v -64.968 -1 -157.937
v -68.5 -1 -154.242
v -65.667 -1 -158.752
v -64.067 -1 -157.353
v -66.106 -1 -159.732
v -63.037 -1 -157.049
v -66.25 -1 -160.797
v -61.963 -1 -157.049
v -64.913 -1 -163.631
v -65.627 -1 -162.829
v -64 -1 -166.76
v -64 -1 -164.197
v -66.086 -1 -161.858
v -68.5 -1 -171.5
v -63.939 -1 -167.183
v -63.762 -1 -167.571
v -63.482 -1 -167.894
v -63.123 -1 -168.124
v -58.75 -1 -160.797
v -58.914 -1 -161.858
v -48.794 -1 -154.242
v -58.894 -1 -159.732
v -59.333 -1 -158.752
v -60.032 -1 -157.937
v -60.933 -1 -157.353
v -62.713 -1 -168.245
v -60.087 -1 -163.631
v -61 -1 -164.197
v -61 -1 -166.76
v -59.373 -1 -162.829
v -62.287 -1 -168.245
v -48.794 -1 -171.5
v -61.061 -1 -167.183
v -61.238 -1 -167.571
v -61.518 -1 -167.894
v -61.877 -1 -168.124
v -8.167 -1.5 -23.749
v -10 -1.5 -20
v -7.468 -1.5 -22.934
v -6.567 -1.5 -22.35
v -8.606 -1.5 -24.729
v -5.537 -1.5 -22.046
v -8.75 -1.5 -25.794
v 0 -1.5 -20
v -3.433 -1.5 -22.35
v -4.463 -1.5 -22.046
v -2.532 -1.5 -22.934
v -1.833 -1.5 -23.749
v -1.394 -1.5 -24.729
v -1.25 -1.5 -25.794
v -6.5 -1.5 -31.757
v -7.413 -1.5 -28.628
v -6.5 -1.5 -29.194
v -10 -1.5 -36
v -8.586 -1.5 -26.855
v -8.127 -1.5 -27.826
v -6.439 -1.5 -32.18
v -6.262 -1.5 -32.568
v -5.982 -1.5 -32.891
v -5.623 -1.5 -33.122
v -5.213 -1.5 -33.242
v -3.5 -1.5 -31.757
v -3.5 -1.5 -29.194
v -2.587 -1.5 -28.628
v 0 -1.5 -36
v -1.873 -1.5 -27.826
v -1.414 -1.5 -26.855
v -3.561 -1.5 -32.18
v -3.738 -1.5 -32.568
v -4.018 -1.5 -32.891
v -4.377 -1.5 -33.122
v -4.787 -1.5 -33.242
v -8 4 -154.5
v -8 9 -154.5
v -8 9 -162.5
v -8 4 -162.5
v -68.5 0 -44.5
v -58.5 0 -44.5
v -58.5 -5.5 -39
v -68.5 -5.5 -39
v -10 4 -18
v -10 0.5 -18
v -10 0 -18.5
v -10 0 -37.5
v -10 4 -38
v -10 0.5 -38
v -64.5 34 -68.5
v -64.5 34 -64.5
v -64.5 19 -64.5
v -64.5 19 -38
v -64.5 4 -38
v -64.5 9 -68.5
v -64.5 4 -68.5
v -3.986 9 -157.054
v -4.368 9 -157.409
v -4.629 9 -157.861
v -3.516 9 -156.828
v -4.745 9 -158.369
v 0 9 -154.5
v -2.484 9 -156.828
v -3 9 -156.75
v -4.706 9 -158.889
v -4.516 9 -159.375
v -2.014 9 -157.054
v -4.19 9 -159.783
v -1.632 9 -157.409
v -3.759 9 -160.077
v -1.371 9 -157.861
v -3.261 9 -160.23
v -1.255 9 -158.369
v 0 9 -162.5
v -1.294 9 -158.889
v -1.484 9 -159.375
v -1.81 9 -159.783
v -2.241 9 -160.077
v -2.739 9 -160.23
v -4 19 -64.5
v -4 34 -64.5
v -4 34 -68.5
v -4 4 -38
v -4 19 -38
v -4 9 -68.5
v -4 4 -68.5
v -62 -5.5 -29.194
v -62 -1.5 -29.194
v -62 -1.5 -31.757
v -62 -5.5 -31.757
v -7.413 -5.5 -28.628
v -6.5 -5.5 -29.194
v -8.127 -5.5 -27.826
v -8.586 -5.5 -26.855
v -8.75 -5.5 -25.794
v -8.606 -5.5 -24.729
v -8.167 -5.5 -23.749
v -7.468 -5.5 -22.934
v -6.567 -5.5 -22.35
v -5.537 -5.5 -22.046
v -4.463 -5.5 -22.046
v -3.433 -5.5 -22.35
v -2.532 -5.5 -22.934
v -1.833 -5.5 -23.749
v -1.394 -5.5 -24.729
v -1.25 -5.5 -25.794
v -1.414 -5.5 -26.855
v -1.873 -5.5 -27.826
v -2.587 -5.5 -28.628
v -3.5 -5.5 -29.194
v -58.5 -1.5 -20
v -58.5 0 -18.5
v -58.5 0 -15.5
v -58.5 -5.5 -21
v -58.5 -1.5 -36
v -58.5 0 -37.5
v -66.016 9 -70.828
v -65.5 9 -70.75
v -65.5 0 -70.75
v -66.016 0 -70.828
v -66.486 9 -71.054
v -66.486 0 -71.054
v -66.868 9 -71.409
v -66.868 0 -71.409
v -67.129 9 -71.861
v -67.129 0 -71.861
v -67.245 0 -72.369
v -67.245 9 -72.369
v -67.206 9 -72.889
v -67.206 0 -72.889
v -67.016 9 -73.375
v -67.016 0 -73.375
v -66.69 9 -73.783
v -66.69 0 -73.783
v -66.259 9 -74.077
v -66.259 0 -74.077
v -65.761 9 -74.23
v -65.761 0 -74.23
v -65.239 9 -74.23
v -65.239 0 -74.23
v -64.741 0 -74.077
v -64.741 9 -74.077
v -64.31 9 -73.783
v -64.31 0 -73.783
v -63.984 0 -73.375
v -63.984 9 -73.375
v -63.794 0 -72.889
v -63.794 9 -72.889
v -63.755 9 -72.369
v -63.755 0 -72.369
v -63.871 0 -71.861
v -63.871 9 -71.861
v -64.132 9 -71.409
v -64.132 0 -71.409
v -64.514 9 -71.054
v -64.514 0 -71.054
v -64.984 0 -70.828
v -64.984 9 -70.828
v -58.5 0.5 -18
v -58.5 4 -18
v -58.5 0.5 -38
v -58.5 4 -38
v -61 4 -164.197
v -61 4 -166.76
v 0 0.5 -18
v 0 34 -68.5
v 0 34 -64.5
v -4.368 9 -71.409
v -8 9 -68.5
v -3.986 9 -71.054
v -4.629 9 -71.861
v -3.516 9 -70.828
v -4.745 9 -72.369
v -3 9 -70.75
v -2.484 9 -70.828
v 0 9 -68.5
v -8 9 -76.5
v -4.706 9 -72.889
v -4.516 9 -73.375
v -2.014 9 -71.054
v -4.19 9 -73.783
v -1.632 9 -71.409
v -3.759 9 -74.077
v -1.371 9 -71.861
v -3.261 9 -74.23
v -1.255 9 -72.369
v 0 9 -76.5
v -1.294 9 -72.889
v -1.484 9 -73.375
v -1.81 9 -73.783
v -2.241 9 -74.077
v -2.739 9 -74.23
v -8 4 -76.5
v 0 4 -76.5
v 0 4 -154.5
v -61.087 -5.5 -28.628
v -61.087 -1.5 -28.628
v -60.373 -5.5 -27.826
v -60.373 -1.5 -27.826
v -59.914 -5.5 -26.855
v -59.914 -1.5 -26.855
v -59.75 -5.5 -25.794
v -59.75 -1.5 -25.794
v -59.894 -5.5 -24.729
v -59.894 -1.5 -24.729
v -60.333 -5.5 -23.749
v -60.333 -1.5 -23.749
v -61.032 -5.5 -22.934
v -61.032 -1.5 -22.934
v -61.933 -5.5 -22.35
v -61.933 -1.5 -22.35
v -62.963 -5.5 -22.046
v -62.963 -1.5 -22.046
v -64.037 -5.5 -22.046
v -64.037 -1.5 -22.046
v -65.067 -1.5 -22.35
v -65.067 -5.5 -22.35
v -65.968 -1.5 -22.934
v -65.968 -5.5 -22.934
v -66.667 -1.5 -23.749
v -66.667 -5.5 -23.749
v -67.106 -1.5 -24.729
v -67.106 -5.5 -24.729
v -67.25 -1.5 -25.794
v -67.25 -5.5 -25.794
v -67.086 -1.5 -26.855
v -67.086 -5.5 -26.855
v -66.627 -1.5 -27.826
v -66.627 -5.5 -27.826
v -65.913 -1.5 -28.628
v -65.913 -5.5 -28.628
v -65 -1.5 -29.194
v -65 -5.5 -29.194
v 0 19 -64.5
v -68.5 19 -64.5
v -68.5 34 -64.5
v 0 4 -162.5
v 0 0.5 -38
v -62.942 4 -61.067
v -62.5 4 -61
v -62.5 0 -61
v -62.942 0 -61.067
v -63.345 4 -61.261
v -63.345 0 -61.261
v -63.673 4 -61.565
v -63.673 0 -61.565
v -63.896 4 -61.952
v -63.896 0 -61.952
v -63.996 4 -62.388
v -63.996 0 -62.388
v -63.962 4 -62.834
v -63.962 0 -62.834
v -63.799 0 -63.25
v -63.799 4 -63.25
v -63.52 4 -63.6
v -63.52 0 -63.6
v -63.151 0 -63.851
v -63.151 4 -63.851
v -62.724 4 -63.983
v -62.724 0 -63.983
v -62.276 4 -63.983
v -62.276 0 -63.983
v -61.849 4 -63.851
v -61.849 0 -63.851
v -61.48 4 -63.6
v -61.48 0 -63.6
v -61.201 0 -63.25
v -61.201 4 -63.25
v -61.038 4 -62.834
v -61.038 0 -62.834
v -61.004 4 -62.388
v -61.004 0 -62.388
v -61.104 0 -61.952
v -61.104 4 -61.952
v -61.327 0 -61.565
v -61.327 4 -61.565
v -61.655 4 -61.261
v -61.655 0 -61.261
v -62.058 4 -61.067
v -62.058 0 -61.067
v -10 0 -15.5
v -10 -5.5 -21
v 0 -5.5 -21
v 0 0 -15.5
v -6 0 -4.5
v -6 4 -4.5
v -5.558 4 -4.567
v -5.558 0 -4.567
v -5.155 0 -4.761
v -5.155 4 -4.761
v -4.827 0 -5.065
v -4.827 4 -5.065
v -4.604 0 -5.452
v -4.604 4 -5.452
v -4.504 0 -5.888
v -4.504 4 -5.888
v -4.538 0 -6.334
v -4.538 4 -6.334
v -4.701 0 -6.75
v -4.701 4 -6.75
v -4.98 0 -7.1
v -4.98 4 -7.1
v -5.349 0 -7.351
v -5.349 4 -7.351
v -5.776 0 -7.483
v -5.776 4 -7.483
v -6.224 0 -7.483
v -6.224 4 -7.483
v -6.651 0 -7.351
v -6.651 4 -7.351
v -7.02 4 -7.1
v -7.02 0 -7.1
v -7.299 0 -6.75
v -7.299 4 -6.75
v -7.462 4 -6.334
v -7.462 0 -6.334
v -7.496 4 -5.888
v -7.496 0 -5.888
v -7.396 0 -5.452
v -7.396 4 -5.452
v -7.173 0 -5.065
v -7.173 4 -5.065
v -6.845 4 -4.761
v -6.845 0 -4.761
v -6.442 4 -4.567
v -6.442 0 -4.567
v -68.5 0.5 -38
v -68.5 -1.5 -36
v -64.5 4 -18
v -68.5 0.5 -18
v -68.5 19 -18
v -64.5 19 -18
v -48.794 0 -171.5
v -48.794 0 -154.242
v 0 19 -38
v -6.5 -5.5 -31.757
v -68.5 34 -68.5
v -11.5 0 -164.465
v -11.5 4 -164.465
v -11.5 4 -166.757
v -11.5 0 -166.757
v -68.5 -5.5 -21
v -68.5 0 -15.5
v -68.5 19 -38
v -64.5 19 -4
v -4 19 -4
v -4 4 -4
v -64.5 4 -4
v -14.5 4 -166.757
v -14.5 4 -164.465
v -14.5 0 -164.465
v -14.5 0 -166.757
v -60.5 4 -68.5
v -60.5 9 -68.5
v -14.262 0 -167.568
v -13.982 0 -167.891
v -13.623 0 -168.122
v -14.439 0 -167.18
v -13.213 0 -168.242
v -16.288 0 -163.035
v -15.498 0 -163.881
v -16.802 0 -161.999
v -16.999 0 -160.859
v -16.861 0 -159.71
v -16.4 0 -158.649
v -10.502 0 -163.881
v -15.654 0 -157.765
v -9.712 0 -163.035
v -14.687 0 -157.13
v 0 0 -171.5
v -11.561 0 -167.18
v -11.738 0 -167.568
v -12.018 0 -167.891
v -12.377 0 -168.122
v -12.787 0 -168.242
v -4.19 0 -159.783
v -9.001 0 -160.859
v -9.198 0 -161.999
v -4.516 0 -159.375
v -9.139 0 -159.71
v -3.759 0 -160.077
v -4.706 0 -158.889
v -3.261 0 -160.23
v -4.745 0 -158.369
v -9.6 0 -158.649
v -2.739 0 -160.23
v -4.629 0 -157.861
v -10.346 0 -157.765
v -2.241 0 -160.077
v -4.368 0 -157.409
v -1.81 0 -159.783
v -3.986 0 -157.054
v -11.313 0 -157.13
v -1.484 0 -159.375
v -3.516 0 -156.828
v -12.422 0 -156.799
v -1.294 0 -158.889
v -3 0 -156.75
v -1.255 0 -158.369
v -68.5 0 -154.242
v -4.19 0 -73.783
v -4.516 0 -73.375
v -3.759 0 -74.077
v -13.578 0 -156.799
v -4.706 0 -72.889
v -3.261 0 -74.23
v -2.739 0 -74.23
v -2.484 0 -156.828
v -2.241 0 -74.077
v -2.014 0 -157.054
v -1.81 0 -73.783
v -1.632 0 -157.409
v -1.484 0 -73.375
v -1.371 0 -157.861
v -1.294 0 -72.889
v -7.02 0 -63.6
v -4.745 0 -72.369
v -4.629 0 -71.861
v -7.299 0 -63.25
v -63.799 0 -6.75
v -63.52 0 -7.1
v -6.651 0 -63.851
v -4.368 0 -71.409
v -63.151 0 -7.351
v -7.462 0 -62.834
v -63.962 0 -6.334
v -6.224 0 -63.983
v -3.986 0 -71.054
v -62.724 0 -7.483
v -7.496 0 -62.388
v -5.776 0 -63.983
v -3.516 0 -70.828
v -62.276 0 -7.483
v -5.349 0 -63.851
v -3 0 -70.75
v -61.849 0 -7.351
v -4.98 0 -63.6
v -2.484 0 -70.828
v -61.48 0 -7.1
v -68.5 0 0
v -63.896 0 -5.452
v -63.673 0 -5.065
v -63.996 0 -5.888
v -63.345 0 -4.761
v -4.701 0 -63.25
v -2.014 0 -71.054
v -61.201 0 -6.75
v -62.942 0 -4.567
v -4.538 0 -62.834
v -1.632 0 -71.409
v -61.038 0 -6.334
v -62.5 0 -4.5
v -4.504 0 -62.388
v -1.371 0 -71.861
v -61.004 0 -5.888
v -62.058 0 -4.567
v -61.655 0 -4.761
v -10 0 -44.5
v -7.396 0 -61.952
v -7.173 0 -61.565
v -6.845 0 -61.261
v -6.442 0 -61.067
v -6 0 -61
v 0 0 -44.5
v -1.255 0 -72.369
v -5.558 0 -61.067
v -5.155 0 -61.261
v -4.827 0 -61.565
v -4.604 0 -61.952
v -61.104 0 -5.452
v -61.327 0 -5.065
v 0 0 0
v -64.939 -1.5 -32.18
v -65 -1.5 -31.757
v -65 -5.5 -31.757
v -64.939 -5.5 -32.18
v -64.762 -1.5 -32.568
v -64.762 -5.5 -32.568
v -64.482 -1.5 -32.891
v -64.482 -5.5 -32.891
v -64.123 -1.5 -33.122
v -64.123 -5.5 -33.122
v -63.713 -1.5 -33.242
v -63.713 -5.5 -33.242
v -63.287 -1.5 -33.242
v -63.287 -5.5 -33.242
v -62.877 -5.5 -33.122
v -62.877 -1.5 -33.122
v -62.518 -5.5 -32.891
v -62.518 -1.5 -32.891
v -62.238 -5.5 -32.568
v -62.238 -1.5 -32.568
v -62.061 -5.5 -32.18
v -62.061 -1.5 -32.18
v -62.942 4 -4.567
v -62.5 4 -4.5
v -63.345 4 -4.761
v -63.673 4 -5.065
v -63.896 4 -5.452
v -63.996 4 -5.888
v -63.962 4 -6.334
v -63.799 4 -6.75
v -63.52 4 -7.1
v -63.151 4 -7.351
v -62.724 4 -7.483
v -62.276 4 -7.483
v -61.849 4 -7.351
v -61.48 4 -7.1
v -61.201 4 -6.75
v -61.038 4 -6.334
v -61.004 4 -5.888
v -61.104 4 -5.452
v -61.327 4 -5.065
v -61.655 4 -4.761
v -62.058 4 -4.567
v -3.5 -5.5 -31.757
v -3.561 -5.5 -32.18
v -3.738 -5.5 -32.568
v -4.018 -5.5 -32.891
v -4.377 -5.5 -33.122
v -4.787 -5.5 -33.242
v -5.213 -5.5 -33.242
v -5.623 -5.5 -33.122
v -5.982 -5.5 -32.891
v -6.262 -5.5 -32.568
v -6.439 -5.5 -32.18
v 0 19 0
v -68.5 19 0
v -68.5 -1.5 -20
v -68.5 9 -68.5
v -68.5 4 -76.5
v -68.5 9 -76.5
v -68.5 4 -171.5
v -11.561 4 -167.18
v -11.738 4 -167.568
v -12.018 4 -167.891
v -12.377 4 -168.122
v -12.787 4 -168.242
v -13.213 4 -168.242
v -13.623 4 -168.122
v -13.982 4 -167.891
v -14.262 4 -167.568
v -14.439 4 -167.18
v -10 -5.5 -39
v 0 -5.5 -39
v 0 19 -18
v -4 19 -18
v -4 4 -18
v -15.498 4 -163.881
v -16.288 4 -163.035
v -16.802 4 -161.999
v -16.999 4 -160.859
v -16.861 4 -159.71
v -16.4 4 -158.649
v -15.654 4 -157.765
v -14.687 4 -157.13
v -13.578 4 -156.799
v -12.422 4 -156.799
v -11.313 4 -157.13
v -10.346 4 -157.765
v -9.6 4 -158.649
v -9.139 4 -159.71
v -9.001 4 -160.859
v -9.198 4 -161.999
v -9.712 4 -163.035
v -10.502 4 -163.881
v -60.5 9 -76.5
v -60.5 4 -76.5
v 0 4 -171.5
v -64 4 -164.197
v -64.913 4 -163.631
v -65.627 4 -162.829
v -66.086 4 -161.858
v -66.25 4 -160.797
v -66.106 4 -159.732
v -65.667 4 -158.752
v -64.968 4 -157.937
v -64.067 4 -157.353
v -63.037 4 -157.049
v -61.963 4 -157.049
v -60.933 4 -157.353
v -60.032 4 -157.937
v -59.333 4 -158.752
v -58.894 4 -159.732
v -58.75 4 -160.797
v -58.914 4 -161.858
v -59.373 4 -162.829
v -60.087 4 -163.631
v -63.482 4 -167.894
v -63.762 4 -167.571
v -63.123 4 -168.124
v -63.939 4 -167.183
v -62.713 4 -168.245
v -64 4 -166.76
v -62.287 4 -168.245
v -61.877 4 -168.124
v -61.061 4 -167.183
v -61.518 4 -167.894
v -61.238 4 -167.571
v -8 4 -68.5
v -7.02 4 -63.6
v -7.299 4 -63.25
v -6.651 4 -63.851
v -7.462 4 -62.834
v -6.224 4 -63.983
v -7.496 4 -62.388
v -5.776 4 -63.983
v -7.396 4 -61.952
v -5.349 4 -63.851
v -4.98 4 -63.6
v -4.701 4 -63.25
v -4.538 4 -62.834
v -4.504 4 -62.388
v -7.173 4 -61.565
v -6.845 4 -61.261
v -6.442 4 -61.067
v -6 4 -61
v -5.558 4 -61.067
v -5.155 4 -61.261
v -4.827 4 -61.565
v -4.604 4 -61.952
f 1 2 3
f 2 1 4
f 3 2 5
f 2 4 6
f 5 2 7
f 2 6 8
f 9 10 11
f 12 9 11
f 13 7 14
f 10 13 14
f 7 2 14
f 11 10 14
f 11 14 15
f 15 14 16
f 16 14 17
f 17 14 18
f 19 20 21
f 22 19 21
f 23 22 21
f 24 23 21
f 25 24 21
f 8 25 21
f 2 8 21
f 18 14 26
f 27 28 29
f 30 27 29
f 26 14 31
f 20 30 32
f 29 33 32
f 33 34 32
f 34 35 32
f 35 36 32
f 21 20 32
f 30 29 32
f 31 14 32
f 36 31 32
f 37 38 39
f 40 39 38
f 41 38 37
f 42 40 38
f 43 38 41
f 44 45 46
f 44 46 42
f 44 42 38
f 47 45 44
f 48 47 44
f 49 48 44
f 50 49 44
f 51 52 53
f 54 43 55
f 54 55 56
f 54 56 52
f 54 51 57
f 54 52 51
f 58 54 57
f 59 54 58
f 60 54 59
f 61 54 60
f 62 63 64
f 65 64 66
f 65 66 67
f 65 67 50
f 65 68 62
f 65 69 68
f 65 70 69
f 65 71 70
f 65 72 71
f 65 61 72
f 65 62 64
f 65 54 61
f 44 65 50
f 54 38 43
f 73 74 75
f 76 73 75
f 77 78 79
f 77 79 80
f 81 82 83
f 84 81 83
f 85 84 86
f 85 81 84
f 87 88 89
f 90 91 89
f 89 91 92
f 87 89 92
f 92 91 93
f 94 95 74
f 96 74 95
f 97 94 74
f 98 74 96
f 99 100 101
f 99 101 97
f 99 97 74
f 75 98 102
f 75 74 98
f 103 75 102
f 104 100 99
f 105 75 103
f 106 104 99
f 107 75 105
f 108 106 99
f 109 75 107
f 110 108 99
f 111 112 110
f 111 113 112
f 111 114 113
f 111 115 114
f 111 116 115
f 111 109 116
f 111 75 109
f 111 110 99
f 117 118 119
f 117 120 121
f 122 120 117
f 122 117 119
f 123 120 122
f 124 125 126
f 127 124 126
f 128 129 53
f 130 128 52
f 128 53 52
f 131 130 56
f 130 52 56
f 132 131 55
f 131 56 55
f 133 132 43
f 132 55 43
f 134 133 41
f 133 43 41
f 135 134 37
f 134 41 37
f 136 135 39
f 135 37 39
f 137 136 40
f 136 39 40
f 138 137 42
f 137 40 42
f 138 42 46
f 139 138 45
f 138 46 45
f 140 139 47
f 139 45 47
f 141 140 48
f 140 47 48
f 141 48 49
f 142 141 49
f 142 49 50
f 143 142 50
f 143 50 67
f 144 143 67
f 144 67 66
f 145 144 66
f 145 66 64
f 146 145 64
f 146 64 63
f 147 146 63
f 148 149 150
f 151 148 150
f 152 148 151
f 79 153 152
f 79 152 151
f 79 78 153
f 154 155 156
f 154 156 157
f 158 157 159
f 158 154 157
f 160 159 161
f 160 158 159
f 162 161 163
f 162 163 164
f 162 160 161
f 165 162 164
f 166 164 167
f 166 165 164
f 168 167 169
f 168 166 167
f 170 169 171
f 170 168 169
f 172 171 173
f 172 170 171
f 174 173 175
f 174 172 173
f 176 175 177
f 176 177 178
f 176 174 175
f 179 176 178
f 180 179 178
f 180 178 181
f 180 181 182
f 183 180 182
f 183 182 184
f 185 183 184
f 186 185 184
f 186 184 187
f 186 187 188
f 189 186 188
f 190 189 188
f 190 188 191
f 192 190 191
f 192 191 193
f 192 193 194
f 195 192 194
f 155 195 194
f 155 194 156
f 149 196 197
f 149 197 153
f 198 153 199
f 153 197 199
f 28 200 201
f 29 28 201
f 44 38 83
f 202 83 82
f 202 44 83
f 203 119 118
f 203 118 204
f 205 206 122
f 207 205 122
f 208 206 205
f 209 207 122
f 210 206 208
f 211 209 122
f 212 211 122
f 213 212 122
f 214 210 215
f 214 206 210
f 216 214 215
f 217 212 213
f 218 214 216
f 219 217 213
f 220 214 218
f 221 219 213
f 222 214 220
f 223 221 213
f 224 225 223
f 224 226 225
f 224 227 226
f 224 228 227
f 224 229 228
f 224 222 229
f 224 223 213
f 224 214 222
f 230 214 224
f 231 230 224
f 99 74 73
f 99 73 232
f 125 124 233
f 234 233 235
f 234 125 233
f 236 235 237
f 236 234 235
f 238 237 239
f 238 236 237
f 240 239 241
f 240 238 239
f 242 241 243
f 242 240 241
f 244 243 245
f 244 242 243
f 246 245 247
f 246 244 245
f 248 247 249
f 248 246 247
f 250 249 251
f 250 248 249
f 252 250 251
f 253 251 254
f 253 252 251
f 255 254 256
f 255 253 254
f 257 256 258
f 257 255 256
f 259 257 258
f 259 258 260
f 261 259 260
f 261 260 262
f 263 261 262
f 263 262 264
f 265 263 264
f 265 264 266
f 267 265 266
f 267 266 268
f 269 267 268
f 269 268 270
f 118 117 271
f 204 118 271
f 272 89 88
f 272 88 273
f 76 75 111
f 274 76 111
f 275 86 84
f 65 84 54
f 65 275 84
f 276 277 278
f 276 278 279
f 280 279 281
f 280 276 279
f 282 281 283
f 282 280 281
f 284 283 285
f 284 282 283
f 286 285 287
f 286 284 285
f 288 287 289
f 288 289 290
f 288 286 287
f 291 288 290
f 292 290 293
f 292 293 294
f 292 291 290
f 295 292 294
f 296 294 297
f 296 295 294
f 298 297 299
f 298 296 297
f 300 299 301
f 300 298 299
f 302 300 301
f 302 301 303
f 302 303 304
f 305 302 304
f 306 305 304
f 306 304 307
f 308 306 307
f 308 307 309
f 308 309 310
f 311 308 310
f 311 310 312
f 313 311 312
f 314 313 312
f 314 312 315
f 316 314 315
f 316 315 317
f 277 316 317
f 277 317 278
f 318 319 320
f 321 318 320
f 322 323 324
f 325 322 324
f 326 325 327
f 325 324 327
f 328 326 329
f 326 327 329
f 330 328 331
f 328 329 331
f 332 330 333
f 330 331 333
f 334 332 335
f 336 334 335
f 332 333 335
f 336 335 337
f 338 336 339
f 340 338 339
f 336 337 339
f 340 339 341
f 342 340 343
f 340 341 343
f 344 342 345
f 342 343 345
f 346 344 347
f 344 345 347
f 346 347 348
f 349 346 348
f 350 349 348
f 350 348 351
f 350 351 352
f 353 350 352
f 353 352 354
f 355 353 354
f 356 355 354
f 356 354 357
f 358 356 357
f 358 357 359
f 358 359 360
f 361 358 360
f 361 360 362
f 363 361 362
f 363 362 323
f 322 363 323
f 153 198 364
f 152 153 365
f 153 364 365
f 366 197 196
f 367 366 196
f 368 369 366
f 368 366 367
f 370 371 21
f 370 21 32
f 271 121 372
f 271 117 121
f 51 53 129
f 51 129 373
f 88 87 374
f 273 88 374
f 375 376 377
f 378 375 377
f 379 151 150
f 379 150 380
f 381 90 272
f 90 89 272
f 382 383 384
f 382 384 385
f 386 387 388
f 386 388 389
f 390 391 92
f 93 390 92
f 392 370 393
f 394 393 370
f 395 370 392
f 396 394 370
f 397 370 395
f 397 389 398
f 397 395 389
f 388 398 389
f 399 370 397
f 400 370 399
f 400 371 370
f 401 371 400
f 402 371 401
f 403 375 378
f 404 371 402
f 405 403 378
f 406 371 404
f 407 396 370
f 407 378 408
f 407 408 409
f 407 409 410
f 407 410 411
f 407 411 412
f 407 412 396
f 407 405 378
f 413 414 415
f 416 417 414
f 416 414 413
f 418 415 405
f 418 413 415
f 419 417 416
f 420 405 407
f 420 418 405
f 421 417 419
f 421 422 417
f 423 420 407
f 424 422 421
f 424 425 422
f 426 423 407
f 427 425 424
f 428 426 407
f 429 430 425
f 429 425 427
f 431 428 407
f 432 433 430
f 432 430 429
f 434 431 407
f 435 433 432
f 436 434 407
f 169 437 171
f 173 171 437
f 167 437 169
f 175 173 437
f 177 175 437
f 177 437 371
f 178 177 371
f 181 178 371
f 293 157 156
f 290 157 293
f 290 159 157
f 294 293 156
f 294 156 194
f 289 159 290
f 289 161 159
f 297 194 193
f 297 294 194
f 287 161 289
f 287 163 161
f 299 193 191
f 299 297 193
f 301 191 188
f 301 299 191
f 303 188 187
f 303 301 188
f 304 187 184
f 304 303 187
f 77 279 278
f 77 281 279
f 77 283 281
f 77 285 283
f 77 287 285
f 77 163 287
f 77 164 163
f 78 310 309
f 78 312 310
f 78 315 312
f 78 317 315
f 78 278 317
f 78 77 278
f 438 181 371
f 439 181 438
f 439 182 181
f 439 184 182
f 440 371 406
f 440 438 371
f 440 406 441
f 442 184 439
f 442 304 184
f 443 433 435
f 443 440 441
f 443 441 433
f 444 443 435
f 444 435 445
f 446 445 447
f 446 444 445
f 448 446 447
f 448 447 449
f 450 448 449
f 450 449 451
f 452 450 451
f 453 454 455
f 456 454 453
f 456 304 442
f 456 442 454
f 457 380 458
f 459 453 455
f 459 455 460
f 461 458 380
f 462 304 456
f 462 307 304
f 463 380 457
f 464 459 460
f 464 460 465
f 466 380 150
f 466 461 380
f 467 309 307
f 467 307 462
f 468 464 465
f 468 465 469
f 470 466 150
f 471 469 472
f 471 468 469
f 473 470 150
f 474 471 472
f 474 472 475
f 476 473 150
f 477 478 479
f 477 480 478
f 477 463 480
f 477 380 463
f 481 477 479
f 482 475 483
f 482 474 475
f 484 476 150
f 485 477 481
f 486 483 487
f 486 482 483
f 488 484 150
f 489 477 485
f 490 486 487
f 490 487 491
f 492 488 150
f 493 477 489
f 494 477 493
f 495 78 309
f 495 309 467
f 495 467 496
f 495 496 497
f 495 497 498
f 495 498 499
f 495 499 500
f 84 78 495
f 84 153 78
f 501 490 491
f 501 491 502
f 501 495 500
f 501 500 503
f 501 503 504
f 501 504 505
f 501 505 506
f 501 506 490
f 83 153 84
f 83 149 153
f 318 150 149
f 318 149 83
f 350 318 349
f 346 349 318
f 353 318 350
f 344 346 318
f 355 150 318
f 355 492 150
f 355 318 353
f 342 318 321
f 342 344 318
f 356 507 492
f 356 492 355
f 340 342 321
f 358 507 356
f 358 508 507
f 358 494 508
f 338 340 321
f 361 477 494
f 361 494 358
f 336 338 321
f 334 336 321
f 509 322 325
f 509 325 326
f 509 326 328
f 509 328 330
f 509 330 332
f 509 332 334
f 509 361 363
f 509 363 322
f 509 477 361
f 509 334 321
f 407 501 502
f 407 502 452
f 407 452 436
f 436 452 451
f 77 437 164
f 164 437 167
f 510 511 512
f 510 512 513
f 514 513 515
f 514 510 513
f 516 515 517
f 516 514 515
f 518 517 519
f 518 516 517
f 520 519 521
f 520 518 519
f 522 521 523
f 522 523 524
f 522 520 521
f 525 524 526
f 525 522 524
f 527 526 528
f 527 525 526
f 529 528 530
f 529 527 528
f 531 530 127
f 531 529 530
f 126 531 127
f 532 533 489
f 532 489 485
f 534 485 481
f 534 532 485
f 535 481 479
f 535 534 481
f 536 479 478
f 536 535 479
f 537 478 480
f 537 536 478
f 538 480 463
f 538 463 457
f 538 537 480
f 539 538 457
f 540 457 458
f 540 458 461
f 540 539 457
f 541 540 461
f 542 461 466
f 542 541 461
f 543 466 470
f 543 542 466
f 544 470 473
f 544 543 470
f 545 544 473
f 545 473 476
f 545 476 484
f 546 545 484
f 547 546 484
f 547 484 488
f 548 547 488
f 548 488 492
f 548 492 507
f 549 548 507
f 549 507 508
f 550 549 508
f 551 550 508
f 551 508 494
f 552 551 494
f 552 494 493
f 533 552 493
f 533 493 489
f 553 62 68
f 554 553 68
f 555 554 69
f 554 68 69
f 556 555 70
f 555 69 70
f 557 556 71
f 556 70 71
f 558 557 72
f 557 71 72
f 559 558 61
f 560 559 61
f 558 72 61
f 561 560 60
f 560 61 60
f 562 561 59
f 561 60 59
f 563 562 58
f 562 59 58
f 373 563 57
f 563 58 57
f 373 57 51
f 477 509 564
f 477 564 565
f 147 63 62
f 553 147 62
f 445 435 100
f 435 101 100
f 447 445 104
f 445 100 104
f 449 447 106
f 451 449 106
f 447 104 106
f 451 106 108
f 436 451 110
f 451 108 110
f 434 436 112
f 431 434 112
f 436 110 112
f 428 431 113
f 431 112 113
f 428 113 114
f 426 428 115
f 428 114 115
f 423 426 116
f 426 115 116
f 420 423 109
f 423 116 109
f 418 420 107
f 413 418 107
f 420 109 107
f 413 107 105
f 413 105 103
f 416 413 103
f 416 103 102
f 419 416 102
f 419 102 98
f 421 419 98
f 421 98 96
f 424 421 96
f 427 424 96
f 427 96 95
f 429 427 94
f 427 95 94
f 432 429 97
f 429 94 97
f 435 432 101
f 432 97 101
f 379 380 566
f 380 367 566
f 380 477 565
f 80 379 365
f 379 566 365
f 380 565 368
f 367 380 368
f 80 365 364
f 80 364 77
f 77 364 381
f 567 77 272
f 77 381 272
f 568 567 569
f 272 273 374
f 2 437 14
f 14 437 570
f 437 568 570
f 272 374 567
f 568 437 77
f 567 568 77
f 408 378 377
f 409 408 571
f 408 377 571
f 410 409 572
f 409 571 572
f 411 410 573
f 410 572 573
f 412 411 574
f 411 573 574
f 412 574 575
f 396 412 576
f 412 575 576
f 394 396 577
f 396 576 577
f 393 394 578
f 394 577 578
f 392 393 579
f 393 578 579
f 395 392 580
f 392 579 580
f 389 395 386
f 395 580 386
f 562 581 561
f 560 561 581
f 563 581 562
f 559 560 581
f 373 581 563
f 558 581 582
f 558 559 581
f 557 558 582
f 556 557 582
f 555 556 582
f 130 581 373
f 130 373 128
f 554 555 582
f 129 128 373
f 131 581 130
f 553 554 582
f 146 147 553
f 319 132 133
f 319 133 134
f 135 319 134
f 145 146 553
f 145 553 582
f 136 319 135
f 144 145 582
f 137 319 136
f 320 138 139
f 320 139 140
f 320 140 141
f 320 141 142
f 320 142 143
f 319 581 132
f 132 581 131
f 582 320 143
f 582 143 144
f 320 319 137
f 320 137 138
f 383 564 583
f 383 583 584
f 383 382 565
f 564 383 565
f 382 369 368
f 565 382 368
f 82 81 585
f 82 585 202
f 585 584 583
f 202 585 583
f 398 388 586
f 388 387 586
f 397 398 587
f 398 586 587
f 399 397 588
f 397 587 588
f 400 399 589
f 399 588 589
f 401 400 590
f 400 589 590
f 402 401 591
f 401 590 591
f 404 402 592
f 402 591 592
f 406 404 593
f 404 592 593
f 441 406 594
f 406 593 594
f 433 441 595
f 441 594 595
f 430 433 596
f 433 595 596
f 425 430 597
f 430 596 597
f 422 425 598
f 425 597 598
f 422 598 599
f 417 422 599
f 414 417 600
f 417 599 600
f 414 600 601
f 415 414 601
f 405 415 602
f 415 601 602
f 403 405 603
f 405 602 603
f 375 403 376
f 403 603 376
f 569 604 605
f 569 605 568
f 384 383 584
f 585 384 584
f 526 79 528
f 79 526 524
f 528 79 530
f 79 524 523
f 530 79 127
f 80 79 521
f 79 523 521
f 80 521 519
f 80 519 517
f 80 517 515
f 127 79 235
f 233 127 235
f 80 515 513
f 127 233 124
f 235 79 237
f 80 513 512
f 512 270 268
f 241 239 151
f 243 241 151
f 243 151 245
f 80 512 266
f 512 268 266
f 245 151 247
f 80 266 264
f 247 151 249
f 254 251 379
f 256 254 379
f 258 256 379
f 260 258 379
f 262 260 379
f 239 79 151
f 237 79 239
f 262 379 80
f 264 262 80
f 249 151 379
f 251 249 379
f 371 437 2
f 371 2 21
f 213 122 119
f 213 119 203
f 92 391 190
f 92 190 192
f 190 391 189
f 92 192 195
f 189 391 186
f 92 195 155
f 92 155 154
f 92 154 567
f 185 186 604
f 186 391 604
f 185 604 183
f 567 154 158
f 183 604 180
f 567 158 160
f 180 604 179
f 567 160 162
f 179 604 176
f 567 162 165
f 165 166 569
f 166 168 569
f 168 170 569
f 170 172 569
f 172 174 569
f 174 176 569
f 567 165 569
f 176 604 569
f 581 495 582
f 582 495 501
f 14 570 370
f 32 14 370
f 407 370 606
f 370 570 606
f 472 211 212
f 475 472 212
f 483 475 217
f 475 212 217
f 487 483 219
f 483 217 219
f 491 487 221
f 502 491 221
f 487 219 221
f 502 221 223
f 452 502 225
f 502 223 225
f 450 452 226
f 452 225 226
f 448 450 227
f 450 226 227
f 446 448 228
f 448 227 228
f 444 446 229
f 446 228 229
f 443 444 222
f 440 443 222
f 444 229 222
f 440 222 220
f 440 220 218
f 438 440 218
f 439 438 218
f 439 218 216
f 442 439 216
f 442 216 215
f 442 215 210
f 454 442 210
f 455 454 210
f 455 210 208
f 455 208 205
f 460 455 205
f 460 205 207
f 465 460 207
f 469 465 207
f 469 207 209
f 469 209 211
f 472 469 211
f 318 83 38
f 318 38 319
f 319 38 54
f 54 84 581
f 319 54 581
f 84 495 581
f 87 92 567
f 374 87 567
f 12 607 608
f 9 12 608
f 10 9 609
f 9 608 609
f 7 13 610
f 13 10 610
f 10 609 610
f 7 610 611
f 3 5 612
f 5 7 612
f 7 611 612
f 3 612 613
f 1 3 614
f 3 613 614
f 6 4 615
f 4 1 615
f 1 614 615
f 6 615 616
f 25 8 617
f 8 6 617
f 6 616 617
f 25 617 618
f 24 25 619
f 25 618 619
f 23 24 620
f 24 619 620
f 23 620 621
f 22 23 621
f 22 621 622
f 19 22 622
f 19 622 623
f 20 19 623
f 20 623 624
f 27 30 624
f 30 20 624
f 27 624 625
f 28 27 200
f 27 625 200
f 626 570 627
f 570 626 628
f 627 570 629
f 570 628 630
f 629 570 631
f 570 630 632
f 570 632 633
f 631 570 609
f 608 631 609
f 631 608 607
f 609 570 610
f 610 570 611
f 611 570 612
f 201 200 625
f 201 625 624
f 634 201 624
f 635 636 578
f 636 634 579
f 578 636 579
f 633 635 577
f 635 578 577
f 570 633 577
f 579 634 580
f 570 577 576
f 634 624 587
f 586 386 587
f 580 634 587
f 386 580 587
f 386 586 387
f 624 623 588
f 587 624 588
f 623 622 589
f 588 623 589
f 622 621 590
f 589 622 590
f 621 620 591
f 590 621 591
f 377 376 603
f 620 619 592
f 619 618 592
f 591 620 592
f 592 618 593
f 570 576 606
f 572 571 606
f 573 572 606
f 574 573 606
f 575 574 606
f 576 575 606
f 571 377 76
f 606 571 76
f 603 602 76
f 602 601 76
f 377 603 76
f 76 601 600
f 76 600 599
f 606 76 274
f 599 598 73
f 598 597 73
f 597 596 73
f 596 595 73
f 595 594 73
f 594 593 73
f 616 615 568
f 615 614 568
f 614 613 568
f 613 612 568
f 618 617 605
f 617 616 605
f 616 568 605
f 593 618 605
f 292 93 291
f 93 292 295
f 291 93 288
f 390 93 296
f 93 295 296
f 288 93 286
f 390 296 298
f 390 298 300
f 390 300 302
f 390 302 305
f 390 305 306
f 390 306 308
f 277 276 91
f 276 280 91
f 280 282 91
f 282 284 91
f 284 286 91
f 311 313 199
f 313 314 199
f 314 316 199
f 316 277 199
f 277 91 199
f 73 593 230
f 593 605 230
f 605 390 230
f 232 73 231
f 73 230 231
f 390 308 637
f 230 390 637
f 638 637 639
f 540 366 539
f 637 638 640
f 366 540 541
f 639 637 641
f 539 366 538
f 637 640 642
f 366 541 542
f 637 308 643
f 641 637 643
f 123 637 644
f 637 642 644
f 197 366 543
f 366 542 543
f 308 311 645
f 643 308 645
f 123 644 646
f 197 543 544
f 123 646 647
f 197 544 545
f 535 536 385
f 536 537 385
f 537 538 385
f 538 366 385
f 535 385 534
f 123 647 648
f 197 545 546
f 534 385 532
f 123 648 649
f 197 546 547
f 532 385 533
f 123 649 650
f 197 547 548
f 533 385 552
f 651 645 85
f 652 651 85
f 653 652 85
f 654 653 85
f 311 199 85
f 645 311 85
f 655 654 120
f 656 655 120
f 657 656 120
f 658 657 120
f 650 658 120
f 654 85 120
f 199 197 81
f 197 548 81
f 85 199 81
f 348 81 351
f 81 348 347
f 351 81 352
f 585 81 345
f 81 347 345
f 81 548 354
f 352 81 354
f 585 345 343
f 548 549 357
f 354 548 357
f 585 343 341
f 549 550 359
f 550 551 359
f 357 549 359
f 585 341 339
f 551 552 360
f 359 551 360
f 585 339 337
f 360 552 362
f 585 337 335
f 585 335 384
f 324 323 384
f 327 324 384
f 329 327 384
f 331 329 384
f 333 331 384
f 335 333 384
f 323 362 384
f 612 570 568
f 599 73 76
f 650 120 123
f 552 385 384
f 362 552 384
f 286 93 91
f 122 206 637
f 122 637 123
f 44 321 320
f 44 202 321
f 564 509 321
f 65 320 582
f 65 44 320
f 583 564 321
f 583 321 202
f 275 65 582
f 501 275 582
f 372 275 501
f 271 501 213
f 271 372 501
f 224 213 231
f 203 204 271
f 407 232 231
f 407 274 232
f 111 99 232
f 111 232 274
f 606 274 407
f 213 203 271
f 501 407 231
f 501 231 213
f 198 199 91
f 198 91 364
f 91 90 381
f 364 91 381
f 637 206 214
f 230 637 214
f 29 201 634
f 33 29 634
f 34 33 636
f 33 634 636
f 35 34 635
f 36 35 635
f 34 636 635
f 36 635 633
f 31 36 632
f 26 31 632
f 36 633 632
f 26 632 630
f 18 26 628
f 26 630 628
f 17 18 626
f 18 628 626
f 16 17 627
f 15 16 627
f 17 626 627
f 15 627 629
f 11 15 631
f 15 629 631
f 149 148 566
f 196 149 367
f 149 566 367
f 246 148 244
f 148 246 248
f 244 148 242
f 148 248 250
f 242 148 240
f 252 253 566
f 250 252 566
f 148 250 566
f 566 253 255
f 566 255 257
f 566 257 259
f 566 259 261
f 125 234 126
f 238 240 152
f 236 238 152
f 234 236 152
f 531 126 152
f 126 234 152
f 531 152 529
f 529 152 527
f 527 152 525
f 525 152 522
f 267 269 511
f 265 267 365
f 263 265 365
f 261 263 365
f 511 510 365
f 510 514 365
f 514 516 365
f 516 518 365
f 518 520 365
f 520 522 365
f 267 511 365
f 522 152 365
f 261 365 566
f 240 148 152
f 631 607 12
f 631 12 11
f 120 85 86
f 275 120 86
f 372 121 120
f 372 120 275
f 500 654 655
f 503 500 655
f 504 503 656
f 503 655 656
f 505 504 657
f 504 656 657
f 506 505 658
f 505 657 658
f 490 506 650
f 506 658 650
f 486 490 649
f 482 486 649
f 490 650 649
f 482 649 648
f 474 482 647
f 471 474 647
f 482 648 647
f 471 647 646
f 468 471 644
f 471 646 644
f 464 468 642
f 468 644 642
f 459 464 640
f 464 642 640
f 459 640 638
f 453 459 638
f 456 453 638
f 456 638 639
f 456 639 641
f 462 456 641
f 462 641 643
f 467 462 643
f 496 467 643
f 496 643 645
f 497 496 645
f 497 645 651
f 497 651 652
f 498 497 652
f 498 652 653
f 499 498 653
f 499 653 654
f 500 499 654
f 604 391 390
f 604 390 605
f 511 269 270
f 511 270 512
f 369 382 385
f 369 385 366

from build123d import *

# Parameters (mm, degrees)
SKETCH1_W            = 68.5
SKETCH1_H            = 64.5
BOSS_EXTRUDE3_DEPTH  = 19
SKETCH3_W            = 60.5
SKETCH3_H            = 60.5
CUT_EXTRUDE1_DEPTH   = 15
SKETCH5_W            = 68.5
SKETCH5_H            = 4
BOSS_EXTRUDE4_DEPTH  = 105
SKETCH10_W           = 10
SKETCH10_H           = 29
BOSS_EXTRUDE5_DEPTH  = 5.5
SKETCH9_W            = 4
SKETCH9_H            = 20
CUT_EXTRUDE2_DEPTH   = 20.5
SKETCH11_W           = 6
SKETCH11_H           = 20
CUT_EXTRUDE3_DEPTH   = 5.5
CHAMFER2_SIZE        = 5.5
CHAMFER3_SIZE        = 2
SKETCH12_W           = 34.25
SKETCH12_H           = 169.5
CUT_EXTRUDE4_DEPTH   = 50
SKETCH15_R           = 1.5
CUT_EXTRUDE5_DEPTH   = 50
SKETCH16_R           = 1.5
CUT_EXTRUDE6_DEPTH   = 50
SKETCH17_R           = 1.5
CUT_EXTRUDE7_DEPTH   = 50
SKETCH19_W           = 34.25
SKETCH19_H           = 4
BOSS_EXTRUDE6_DEPTH  = 2
SKETCH26_W           = 4
SKETCH26_H           = 4
BOSS_EXTRUDE7_DEPTH  = 30
SKETCH20_R           = 3.75
CUT_EXTRUDE9_DEPTH   = 179.453250181
SKETCH21_W           = 3
SKETCH21_H           = 2.563068229
CUT_EXTRUDE10_DEPTH  = 5
SKETCH18_R           = 1.5
CUT_EXTRUDE8_DEPTH   = 135
SKETCH24_R           = 4
CUT_EXTRUDE13_DEPTH  = 178.441011325
SKETCH25_W           = 3
SKETCH25_H           = 2.291900756
CUT_EXTRUDE14_DEPTH  = 5
SKETCH27_R           = 1.75
CUT_EXTRUDE15_DEPTH  = 178.441011325
BOSS_EXTRUDE9_START  = 5
SKETCH30_W           = 8
SKETCH30_H           = 8
SKETCH30_R           = 1.75
BOSS_EXTRUDE9_DEPTH  = 5
SKETCH31_W           = 8
SKETCH31_H           = 8
CUT_EXTRUDE16_DEPTH  = 5
SKETCH32_W           = 19.705511252
SKETCH32_H           = 17.257631466
BOSS_EXTRUDE10_DEPTH = 5
SKETCH33_R           = 1.5
CUT_EXTRUDE17_DEPTH  = 5
SKETCH34_R           = 3.75
CUT_EXTRUDE18_DEPTH  = 5
SKETCH35_W           = 3
SKETCH35_H           = 2.563068229
CUT_EXTRUDE19_DEPTH  = 5


# Some blends are built 0.0001 mm under size
with BuildPart() as part:
    # Sketch1 → Boss-Extrude3 (new body)
    with BuildSketch(Plane(origin=(0, 0, 0), x_dir=(1, 0, 0), z_dir=(0, 1, 0))):
        with Locations((-34.25, 32.25)):
            Rectangle(SKETCH1_W, SKETCH1_H)
    extrude(amount=BOSS_EXTRUDE3_DEPTH)

    # Sketch3 → Cut-Extrude1 (cut)
    with BuildSketch(Plane(origin=(0, 19, 0), x_dir=(1, 0, 0), z_dir=(0, 1, 0))):
        with Locations((-34.25, 34.25)):
            Rectangle(SKETCH3_W, SKETCH3_H)
    extrude(amount=-CUT_EXTRUDE1_DEPTH, mode=Mode.SUBTRACT)

    # Sketch5 → Boss-Extrude4 (add)
    with BuildSketch(Plane(origin=(0, 0, -64.5), x_dir=(-1, 0, 0), z_dir=(0, 0, -1))):
        with Locations((34.25, 2)):
            Rectangle(SKETCH5_W, SKETCH5_H)
    extrude(amount=BOSS_EXTRUDE4_DEPTH)

    # Sketch10 → Boss-Extrude5 (add)
    with BuildSketch(Plane.XZ):
        with Locations((-5, -30)):
            Rectangle(SKETCH10_W, SKETCH10_H)
    extrude(amount=BOSS_EXTRUDE5_DEPTH)

    # Sketch9 → Cut-Extrude2 (cut)
    with BuildSketch(Plane(origin=(0, 19, 0), x_dir=(1, 0, 0), z_dir=(0, 1, 0))):
        with Locations((-2, 28)):
            Rectangle(SKETCH9_W, SKETCH9_H)
    extrude(amount=-CUT_EXTRUDE2_DEPTH, mode=Mode.SUBTRACT)

    # Sketch11 → Cut-Extrude3 (cut)
    with BuildSketch(Plane(origin=(0, 4, 0), x_dir=(1, 0, 0), z_dir=(0, 1, 0))):
        with Locations((-7, 28)):
            Rectangle(SKETCH11_W, SKETCH11_H)
    extrude(amount=-CUT_EXTRUDE3_DEPTH, mode=Mode.SUBTRACT)

    # Chamfer2
    chamfer2_edges = [part.edges().sort_by_distance(p)[0] for p in [
        (-5, -5.5, -44.5),
        (-5, -5.5, -15.5),
    ]]
    chamfer(chamfer2_edges, length=CHAMFER2_SIZE - 0.0001)  # a hair under: the kernel refuses the full size

    # Chamfer3
    # the kernel refuses this chamfer: 2 mm, written as the material it adds along each edge
    with BuildSketch(Plane(origin=(0, -1.5, -38), x_dir=(0, 0.9996219169112968, -0.027495876610585623), z_dir=(-1, 0, 0)), Plane(origin=(0, -1.5, -18), x_dir=(0, -0.027495876610586403, -0.9996219169112968), z_dir=(-1, 0, 0))) as chamfer3_piece_1:
        Polygon((CHAMFER3_SIZE * 0.999621916911, -CHAMFER3_SIZE * 0.0274958766106), (-CHAMFER3_SIZE * 0.0274958766106, -CHAMFER3_SIZE * 0.999621916911), (0, 0), align=None)
    extrude(amount=10)

    # Sketch12 → Cut-Extrude4 (cut)
    with BuildSketch(Plane(origin=(0, 19, 0), x_dir=(1, 0, 0), z_dir=(0, 1, 0))):
        with Locations((-51.375, 84.75)):
            Rectangle(SKETCH12_W, SKETCH12_H)
    extrude(amount=-CUT_EXTRUDE4_DEPTH, mode=Mode.SUBTRACT)

    # Sketch15 → Cut-Extrude5 (cut)
    with BuildSketch(Plane(origin=(0, -1.5, 0), x_dir=(1, 0, 0), z_dir=(0, 1, 0))):
        with Locations(Location((-5, 31.75713966, 0), (0, 0, 270))):
            Circle(SKETCH15_R)
    extrude(amount=-CUT_EXTRUDE5_DEPTH, mode=Mode.SUBTRACT)

    # Sketch16 → Cut-Extrude6 (cut)
    with BuildSketch(Plane(origin=(0, 4, 0), x_dir=(1, 0, 0), z_dir=(0, 1, 0))):
        with Locations(Location((-6, 6, 0), (0, 0, 270))):
            Circle(SKETCH16_R)
    extrude(amount=-CUT_EXTRUDE6_DEPTH, mode=Mode.SUBTRACT)

    # Sketch17 → Cut-Extrude7 (cut)
    with BuildSketch(Plane(origin=(0, 4, 0), x_dir=(1, 0, 0), z_dir=(0, 1, 0))):
        with Locations(Location((-6, 62.5, 0), (0, 0, 270))):
            Circle(SKETCH17_R)
    extrude(amount=-CUT_EXTRUDE7_DEPTH, mode=Mode.SUBTRACT)

    # Sketch19 → Boss-Extrude6 (add)
    with BuildSketch(Plane(origin=(0, 0, -169.5), x_dir=(-1, 0, 0), z_dir=(0, 0, -1))):
        with Locations((17.125, 2)):
            Rectangle(SKETCH19_W, SKETCH19_H)
    extrude(amount=BOSS_EXTRUDE6_DEPTH)

    # Sketch26 → Boss-Extrude7 (add)
    with BuildSketch(Plane(origin=(0, 4, 0), x_dir=(1, 0, 0), z_dir=(0, 1, 0))):
        with Locations((-2, 66.5)):
            Rectangle(SKETCH26_W, SKETCH26_H)
    extrude(amount=BOSS_EXTRUDE7_DEPTH)

    # Sketch20 → Cut-Extrude9 (cut, through all)
    with BuildSketch(Plane(origin=(0, -1.5, 0), x_dir=(1, 0, 0), z_dir=(0, 1, 0))):
        with Locations(Location((-5, 25.75713966, 0), (0, 0, 270))):
            Circle(SKETCH20_R)
    extrude(amount=-CUT_EXTRUDE9_DEPTH, mode=Mode.SUBTRACT)

    # Sketch21 → Cut-Extrude10 (cut)
    with BuildSketch(Plane(origin=(0, -1.5, 0), x_dir=(1, 0, 0), z_dir=(0, 1, 0))):
        with Locations((-5, 30.475605546)):
            Rectangle(SKETCH21_W, SKETCH21_H)
    extrude(amount=-CUT_EXTRUDE10_DEPTH, mode=Mode.SUBTRACT)

    # Sketch18 → Cut-Extrude8 (cut)
    with BuildSketch(Plane(origin=(0, 4, 0), x_dir=(1, 0, 0), z_dir=(0, 1, 0))):
        with Locations(Location((-13, 166.75713966, 0), (0, 0, 270))):
            Circle(SKETCH18_R)
    extrude(amount=-CUT_EXTRUDE8_DEPTH, mode=Mode.SUBTRACT)

    # Sketch24 → Cut-Extrude13 (cut, through all)
    with BuildSketch(Plane(origin=(0, 4, 0), x_dir=(1, 0, 0), z_dir=(0, 1, 0))):
        with Locations(Location((-13, 160.75713966, 0), (0, 0, 270))):
            Circle(SKETCH24_R)
    extrude(amount=-CUT_EXTRUDE13_DEPTH, mode=Mode.SUBTRACT)

    # Sketch25 → Cut-Extrude14 (cut)
    with BuildSketch(Plane(origin=(0, 4, 0), x_dir=(1, 0, 0), z_dir=(0, 1, 0))):
        with Locations((-13, 165.611189282)):
            Rectangle(SKETCH25_W, SKETCH25_H)
    extrude(amount=-CUT_EXTRUDE14_DEPTH, mode=Mode.SUBTRACT)

    # Sketch27 → Cut-Extrude15 (cut, through all)
    with BuildSketch(Plane(origin=(0, 4, 0), x_dir=(1, 0, 0), z_dir=(0, 1, 0))):
        with Locations(Location((-3, 72.5, 0), (0, 0, 270))):
            Circle(SKETCH27_R)
        with Locations(Location((-3, 158.5, 0), (0, 0, 270))):
            Circle(SKETCH27_R)
    extrude(amount=-CUT_EXTRUDE15_DEPTH, mode=Mode.SUBTRACT)

    # Sketch30 → Boss-Extrude9 (add)
    # profile 1 of 2: a face of its own
    with BuildSketch(Plane(origin=(0, 4, 0), x_dir=(1, 0, 0), z_dir=(0, 1, 0)).offset(BOSS_EXTRUDE9_START)):
        with Locations((-4, 72.5)):
            Rectangle(SKETCH30_W, SKETCH30_H)
        with Locations(Location((-3, 72.5, 0), (0, 0, 270))):
            Circle(SKETCH30_R, mode=Mode.SUBTRACT)
    # profile 2 of 2: a face of its own
    with BuildSketch(Plane(origin=(0, 4, 0), x_dir=(1, 0, 0), z_dir=(0, 1, 0)).offset(BOSS_EXTRUDE9_START)):
        with Locations((-4, 158.5)):
            Rectangle(SKETCH30_W, SKETCH30_H)
        with Locations(Location((-3, 158.5, 0), (0, 0, 270))):
            Circle(SKETCH30_R, mode=Mode.SUBTRACT)
    extrude(amount=-BOSS_EXTRUDE9_DEPTH)

    # Mirror5: part across plane


with BuildPart() as part_1:
    add(part.part)
    add(part.part.mirror(Plane(origin=(-34.25, 0, 0), x_dir=(0, 0, 1), z_dir=(1, 0, 0))))

    # Sketch31 → Cut-Extrude16 (cut)
    with BuildSketch(Plane(origin=(0, 9, 0), x_dir=(1, 0, 0), z_dir=(0, 1, 0))):
        with Locations((-64.5, 158.5)):
            Rectangle(SKETCH31_W, SKETCH31_H)
    extrude(amount=-CUT_EXTRUDE16_DEPTH, mode=Mode.SUBTRACT)

    # Sketch32 → Boss-Extrude10 (add)
    with BuildSketch(Plane(origin=(0, 4, 0), x_dir=(1, 0, 0), z_dir=(0, 1, 0))):
        with Locations((-58.647244374, 162.871184267)):
            Rectangle(SKETCH32_W, SKETCH32_H)
    extrude(amount=-BOSS_EXTRUDE10_DEPTH)

    # Sketch33 → Cut-Extrude17 (cut)
    with BuildSketch(Plane(origin=(0, 4, 0), x_dir=(1, 0, 0), z_dir=(0, 1, 0))):
        with Locations(Location((-62.5, 166.76, 0), (0, 0, 270))):
            Circle(SKETCH33_R)
    extrude(amount=-CUT_EXTRUDE17_DEPTH, mode=Mode.SUBTRACT)

    # Sketch34 → Cut-Extrude18 (cut)
    with BuildSketch(Plane(origin=(0, 4, 0), x_dir=(1, 0, 0), z_dir=(0, 1, 0))):
        with Locations(Location((-62.5, 160.76, 0), (0, 0, 270))):
            Circle(SKETCH34_R)
    extrude(amount=-CUT_EXTRUDE18_DEPTH, mode=Mode.SUBTRACT)

    # Sketch35 → Cut-Extrude19 (cut)
    with BuildSketch(Plane(origin=(0, 4, 0), x_dir=(1, 0, 0), z_dir=(0, 1, 0))):
        with Locations((-62.5, 165.478465886)):
            Rectangle(SKETCH35_W, SKETCH35_H)
    extrude(amount=-CUT_EXTRUDE19_DEPTH, mode=Mode.SUBTRACT)


solid = part_1.part
